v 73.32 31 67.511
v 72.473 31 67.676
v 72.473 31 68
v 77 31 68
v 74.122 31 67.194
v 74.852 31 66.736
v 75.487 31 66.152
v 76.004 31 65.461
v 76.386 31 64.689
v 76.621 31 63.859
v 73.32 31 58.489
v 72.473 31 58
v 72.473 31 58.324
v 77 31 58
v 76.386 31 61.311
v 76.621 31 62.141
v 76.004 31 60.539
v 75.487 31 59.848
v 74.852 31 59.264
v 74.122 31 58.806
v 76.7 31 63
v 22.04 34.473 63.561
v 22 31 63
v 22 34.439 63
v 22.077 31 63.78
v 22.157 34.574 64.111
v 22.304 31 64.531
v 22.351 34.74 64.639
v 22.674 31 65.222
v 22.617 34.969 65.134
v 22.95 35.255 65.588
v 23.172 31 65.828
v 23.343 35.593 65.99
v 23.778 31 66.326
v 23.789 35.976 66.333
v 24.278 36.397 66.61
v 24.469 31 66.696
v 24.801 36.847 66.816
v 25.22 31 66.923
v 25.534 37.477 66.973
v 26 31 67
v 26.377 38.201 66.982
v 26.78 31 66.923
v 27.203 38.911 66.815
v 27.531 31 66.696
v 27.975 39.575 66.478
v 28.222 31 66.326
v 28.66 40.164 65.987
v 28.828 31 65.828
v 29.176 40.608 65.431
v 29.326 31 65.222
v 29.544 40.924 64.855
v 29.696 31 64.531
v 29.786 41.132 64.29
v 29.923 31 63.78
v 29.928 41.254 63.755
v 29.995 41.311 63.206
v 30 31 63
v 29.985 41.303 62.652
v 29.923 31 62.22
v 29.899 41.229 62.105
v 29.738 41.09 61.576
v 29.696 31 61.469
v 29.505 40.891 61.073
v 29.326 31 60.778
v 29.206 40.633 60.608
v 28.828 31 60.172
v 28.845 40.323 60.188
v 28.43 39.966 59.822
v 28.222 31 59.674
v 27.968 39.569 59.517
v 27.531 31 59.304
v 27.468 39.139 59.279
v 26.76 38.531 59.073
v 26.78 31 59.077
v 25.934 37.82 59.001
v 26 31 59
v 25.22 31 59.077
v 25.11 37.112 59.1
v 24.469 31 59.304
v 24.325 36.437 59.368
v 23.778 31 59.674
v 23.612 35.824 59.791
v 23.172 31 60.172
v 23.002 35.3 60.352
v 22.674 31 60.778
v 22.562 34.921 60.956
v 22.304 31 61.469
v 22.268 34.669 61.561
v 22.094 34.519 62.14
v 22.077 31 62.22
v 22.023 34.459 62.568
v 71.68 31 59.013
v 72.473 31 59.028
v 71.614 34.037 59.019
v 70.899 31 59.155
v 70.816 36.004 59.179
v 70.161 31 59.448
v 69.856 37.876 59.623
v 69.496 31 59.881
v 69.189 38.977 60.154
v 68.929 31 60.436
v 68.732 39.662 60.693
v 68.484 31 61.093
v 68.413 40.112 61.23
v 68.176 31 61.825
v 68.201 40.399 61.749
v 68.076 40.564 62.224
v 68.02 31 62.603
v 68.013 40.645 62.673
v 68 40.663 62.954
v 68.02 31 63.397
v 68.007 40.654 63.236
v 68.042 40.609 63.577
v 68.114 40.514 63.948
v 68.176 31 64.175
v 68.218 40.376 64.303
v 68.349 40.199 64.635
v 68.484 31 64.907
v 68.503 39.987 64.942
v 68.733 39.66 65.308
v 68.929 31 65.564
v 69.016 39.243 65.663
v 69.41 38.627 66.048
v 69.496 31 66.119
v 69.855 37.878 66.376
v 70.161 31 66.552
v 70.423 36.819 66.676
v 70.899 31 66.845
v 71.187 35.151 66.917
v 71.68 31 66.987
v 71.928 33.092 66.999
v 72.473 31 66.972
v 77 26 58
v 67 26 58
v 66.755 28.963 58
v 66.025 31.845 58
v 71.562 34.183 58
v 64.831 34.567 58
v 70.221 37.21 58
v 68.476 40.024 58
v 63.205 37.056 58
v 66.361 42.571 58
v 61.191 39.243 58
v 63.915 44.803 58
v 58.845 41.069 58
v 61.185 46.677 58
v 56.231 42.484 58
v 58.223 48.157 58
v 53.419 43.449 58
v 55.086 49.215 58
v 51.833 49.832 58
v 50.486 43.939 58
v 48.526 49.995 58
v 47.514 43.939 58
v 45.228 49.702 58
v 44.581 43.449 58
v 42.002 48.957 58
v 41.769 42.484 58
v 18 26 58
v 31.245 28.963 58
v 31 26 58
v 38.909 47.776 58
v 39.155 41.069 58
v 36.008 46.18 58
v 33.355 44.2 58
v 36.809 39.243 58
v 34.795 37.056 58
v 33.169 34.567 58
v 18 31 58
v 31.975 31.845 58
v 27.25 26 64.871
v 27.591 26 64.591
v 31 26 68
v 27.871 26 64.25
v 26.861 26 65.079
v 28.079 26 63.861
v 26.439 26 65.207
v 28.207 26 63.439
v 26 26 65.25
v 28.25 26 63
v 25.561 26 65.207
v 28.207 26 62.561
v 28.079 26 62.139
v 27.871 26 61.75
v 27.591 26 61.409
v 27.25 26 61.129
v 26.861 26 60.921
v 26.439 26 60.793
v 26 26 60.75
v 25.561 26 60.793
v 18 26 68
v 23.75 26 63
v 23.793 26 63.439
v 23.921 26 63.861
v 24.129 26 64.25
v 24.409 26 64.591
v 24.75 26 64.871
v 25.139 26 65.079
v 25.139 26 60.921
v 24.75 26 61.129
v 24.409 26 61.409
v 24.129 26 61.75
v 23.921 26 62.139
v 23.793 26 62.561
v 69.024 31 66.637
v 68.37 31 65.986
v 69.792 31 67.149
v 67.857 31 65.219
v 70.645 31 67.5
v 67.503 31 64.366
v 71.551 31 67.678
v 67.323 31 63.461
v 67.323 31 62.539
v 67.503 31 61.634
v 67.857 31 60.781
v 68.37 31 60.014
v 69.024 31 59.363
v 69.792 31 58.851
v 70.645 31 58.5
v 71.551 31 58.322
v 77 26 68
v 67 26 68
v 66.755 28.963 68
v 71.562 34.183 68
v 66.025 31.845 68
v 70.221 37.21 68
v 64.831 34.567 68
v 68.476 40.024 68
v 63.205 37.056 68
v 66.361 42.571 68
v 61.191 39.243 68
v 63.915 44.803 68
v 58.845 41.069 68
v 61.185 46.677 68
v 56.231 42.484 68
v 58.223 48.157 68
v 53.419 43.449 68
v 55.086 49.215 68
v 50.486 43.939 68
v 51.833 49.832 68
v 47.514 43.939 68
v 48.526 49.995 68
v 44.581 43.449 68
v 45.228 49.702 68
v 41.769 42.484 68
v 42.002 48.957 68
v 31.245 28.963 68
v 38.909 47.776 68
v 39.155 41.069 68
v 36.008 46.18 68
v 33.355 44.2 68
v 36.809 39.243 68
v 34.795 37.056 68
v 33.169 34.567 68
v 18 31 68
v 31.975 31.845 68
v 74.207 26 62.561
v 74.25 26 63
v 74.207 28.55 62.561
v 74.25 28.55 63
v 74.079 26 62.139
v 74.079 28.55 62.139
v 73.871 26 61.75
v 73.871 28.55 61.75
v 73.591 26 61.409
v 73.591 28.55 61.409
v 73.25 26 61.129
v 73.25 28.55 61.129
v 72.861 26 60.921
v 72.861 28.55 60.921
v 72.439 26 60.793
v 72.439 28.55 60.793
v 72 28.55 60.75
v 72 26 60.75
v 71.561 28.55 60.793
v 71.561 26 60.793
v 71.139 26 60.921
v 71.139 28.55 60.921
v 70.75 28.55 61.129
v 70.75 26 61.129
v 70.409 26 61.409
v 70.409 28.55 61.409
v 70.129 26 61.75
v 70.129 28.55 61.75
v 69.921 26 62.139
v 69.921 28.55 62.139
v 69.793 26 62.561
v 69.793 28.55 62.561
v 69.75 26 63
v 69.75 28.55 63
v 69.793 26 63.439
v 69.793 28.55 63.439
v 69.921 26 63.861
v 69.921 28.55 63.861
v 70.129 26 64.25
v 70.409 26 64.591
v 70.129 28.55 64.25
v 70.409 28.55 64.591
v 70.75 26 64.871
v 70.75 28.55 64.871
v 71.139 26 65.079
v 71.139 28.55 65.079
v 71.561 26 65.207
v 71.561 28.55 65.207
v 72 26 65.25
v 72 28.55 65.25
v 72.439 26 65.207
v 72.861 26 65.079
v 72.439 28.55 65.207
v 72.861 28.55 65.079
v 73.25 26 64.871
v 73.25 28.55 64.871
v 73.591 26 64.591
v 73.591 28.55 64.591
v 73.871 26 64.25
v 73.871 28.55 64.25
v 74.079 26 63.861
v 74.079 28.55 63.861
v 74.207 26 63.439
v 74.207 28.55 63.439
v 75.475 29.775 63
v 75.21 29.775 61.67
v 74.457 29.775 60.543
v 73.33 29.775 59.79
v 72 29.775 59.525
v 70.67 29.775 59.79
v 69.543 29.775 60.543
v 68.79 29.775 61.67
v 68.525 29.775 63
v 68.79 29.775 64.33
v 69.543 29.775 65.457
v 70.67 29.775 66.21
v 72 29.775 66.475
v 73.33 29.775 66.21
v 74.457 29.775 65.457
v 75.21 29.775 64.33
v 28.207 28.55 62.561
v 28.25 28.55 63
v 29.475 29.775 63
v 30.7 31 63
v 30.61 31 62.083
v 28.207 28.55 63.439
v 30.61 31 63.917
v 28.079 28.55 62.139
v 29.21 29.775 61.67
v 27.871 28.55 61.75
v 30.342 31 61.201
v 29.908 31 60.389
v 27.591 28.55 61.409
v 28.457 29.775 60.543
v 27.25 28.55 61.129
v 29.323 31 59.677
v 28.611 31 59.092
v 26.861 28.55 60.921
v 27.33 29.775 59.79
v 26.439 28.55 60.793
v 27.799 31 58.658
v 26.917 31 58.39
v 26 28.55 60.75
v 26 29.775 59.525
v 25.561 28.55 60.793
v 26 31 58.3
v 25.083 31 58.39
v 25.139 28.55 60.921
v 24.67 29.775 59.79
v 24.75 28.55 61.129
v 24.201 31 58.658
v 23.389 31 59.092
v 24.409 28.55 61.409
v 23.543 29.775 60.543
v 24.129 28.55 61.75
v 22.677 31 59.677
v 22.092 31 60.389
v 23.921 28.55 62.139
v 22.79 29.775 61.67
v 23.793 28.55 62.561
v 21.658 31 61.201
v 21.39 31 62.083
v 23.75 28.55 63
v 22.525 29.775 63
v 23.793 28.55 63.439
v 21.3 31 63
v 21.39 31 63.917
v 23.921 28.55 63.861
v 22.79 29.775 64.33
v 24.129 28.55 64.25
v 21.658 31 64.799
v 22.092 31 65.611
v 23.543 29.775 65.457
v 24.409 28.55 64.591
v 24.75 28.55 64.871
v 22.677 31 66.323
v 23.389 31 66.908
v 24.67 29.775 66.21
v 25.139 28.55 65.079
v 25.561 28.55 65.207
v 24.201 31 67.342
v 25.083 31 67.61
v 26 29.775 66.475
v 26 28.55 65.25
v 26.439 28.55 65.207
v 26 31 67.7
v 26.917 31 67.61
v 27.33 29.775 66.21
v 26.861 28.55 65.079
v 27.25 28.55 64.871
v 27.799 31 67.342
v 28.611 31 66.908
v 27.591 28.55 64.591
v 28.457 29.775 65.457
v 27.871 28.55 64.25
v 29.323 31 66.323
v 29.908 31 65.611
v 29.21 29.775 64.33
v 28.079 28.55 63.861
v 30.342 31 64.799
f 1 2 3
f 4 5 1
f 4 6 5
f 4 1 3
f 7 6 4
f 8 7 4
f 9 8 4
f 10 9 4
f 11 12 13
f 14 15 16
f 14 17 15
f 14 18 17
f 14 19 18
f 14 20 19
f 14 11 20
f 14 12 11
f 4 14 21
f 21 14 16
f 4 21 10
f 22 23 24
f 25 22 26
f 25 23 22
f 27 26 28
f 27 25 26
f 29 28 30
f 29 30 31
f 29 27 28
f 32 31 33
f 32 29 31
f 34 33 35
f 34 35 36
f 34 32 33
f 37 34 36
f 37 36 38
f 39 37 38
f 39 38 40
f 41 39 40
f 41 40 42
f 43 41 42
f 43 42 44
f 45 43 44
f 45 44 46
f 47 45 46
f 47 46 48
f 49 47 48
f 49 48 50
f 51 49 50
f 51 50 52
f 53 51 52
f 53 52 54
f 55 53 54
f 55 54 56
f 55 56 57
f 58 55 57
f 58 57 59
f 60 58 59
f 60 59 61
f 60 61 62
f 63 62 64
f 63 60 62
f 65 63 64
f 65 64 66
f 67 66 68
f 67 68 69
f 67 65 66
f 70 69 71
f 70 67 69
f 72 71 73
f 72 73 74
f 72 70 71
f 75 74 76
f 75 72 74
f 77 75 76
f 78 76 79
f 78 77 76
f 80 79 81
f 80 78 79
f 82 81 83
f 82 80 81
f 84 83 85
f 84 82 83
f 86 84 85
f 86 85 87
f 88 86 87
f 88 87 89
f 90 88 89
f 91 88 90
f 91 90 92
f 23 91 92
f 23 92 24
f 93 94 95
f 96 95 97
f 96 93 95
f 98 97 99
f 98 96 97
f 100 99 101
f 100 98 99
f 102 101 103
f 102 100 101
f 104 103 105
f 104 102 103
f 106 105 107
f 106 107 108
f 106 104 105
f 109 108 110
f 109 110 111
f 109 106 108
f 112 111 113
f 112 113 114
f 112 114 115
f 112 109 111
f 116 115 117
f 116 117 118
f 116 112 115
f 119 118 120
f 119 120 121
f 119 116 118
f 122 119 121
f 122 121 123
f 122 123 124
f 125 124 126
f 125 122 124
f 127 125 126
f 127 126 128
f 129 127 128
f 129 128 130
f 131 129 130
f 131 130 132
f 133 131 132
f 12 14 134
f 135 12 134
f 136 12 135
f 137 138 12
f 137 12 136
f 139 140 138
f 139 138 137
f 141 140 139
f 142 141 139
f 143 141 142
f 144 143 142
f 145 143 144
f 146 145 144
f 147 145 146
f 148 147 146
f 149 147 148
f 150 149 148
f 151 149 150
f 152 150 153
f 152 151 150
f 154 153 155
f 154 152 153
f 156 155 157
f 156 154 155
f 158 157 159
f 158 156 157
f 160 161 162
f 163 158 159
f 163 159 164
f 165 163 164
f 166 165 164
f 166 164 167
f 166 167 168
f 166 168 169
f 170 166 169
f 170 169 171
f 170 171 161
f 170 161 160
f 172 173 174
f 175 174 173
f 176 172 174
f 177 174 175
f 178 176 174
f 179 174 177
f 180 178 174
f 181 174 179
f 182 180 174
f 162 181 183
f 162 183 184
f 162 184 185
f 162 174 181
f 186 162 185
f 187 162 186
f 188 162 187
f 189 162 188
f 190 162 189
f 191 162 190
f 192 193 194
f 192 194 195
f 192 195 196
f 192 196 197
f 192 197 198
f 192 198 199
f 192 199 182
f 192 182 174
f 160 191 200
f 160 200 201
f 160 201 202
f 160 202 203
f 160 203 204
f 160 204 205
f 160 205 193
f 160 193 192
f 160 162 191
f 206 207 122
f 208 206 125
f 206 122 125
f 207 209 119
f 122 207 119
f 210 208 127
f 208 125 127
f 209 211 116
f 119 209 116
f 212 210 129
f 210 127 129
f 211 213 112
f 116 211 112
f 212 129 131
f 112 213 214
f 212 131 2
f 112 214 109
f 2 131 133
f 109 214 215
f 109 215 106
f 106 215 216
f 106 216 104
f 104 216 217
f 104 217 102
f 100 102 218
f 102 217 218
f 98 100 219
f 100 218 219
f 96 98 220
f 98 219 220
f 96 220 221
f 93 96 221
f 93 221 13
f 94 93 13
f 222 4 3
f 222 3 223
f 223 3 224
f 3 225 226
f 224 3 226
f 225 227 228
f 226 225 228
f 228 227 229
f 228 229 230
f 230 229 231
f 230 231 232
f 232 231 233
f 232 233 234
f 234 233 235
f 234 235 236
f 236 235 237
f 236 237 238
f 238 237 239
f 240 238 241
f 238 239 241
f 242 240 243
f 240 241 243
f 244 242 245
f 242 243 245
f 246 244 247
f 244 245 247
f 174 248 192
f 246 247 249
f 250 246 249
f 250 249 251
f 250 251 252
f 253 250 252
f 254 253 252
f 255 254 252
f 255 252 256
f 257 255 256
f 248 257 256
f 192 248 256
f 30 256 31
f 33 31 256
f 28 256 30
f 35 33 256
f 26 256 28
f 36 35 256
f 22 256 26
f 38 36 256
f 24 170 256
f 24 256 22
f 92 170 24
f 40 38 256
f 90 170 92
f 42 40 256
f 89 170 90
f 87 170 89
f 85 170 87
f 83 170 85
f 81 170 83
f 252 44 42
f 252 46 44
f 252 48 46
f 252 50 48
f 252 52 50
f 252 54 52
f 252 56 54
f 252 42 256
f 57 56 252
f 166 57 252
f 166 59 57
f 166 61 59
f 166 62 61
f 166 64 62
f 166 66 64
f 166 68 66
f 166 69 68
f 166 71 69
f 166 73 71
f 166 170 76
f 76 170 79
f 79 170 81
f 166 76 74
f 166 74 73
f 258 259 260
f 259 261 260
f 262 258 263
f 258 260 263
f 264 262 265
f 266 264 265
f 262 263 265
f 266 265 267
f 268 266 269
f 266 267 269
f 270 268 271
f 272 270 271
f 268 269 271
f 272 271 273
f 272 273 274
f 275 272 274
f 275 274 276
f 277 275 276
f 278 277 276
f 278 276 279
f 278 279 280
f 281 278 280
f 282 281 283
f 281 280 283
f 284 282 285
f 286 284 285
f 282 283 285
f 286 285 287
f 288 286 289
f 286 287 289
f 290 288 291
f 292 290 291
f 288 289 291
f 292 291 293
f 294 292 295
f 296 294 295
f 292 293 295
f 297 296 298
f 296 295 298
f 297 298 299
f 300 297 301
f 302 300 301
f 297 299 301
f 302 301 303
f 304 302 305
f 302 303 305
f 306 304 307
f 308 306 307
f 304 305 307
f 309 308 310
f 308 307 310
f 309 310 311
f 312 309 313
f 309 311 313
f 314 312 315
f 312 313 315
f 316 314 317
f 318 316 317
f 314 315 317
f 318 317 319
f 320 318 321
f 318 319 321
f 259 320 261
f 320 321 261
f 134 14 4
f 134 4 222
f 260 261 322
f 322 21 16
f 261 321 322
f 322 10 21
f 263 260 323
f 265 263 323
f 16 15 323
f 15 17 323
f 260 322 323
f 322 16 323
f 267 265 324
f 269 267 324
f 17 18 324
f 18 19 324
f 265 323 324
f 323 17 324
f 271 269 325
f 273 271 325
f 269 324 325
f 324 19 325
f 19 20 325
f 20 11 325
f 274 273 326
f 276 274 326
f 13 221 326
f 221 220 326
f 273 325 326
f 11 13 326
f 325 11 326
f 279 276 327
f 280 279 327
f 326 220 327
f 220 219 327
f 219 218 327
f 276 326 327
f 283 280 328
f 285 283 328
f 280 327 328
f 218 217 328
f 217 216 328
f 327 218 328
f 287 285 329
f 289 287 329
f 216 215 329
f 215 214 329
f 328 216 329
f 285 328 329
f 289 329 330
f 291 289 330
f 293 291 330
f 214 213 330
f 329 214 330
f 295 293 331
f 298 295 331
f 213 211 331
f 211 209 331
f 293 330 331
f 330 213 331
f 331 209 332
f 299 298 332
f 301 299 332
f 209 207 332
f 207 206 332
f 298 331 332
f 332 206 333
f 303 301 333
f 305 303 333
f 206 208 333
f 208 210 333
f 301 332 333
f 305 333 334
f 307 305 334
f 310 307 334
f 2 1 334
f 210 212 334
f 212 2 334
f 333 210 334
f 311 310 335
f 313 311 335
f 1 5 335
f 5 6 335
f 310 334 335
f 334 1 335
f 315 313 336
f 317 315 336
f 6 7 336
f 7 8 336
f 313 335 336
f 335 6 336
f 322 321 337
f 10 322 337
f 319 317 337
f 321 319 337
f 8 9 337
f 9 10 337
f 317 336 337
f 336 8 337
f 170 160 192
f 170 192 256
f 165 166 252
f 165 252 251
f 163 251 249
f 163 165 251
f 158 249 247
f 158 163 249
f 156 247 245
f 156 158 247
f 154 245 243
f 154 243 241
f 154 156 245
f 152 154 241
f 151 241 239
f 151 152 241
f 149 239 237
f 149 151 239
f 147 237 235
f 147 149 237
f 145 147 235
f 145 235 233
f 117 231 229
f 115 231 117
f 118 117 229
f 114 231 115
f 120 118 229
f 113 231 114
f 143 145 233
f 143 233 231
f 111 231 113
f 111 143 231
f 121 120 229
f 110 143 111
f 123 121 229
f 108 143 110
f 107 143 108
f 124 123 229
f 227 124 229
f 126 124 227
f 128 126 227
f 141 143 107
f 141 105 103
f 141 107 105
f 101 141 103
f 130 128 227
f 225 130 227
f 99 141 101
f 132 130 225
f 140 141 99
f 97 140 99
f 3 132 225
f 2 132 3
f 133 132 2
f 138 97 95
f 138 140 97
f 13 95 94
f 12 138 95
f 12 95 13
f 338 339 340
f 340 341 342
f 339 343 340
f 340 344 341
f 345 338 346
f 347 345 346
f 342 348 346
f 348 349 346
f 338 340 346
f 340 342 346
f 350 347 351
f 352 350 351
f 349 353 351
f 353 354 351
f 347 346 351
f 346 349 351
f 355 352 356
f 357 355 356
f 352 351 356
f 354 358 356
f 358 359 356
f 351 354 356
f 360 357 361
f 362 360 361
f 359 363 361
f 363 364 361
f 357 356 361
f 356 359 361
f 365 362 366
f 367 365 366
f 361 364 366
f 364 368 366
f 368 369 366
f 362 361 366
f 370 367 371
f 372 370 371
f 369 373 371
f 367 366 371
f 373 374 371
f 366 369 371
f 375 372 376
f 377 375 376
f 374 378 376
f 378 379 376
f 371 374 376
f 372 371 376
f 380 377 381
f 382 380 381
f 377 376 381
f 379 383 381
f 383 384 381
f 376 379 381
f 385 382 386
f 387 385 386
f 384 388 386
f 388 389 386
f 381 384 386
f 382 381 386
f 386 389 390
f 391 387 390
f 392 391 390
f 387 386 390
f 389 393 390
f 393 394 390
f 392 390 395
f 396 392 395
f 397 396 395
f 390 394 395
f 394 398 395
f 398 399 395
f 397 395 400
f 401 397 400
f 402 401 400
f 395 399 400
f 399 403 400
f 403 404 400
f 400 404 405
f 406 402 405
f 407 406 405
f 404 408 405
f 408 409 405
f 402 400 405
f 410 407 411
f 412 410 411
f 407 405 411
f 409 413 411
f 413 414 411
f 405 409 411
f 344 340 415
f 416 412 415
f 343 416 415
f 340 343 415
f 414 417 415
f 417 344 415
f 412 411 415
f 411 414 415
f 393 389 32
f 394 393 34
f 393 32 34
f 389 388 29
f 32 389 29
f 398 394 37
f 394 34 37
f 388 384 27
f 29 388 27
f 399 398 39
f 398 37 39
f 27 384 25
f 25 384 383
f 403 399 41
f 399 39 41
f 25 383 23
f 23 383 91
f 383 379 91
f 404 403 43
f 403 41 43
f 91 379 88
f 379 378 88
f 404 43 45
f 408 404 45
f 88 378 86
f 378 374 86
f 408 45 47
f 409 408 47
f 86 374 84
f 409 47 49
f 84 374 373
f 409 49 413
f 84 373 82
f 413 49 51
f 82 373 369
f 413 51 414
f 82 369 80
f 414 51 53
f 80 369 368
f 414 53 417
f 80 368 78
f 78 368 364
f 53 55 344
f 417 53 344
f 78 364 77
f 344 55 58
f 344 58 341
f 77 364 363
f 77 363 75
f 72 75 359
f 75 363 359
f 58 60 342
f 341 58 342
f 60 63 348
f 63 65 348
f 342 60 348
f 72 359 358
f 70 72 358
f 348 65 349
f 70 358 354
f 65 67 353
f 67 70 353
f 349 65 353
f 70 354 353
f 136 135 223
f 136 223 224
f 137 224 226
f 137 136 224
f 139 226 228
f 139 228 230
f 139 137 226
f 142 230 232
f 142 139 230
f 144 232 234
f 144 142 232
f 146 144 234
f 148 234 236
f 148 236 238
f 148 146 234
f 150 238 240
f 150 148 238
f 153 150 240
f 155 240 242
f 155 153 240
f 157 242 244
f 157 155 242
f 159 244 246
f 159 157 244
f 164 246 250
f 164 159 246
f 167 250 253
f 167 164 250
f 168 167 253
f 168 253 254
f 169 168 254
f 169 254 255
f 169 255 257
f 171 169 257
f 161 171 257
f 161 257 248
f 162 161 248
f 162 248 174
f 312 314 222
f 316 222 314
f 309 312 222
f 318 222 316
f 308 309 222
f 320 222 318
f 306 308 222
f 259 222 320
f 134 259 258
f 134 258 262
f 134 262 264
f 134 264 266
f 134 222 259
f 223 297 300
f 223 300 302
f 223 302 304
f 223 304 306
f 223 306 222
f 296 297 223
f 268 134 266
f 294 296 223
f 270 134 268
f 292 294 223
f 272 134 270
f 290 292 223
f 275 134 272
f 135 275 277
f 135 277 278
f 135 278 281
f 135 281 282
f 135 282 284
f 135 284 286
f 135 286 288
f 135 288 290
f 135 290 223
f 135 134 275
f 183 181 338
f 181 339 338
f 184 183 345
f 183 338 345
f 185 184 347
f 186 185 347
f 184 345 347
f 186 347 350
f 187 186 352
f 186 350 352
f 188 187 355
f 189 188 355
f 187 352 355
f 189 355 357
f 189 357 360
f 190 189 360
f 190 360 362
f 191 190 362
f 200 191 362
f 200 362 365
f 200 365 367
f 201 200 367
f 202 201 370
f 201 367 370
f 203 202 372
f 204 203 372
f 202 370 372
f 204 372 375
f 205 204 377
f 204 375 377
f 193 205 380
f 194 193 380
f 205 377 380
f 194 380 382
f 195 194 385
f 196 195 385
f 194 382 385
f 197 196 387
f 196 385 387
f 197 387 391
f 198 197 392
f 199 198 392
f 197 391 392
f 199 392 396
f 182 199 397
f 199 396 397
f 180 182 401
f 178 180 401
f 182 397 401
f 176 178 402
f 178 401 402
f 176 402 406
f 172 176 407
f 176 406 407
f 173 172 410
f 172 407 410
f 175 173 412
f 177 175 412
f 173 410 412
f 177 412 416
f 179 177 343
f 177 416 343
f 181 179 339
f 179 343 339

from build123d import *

# Parameters (mm, degrees)
EXTRUDE_1_DEPTH     = 10
CUT_EXTRUDE_1_REACH = 106.47
SKETCH_2_R          = 4


# Read off the part's stored shape, not the designer's step: 高级异型孔1
with BuildPart() as part:
    # 草图1 → 凸台-拉伸1 (new body)
    with BuildSketch(Plane.XY.offset(58)):
        with BuildLine():
            Line((31, 26), (18, 26))
            Line((18, 26), (18, 31))
            Line((18, 31), (33.354781752, 44.199646864))
            ThreePointArc((33.354781752, 44.199646864), (56.673182808, 48.74032246), (72.473389189, 31))
            Line((72.473389189, 31), (77, 31))
            Line((77, 31), (77, 26))
            Line((77, 26), (67, 26))
            ThreePointArc((67, 26), (49, 44), (31, 26))
        make_face()
    extrude(amount=EXTRUDE_1_DEPTH)

    # 草图2 → 切除-拉伸1 (cut, up to next)
    with BuildSketch(Plane(origin=(0, 31, 0), x_dir=(1, 0, 0), z_dir=(0, 1, 0)), mode=Mode.PRIVATE) as cut_extrude_1_sk1:
        with Locations(Location((26, -63, 0), (0, 0, 180))):
            Circle(SKETCH_2_R)
    cut_extrude_1_tool1 = extrude(cut_extrude_1_sk1.sketch, amount=CUT_EXTRUDE_1_REACH, mode=Mode.PRIVATE) & part.part
    # 草图2 → 切除-拉伸1 (cut, up to next)
    with BuildSketch(Plane(origin=(0, 31, 0), x_dir=(1, 0, 0), z_dir=(0, 1, 0)), mode=Mode.PRIVATE) as cut_extrude_1_sk2:
        with Locations((72, -63)):
            Circle(SKETCH_2_R)
    cut_extrude_1_tool2 = extrude(cut_extrude_1_sk2.sketch, amount=CUT_EXTRUDE_1_REACH, mode=Mode.PRIVATE) & part.part
    add(cut_extrude_1_tool1.solids().sort_by_distance((26, 31, 63))[0], mode=Mode.SUBTRACT)
    add(cut_extrude_1_tool2.solids().sort_by_distance((72, 31, 63))[0], mode=Mode.SUBTRACT)

    # 高级异型孔1 outline → 高级异型孔1 (revolve, cut)
    with BuildSketch(Plane(origin=(72, 0, 63), x_dir=(1, 0, 0), z_dir=(0, 0, 1))):
        Polygon((0, 26), (2.25, 26), (2.25, 28.55), (4.7, 31), (0, 31), align=None)
    revolve(axis=Axis((72, 0, 63), (0, 1, 0)), mode=Mode.SUBTRACT)

    # Other 1 2 outline → Other 1 2 (revolve, cut)
    with BuildSketch(Plane(origin=(26, 0, 63), x_dir=(1, 0, 0), z_dir=(0, 0, 1))):
        Polygon((4.7, 31), (0, 31), (0, 26), (2.25, 26), (2.25, 28.55), align=None)
    revolve(axis=Axis((26, 0, 63), (0, 1, 0)), mode=Mode.SUBTRACT)


solid = part.part
